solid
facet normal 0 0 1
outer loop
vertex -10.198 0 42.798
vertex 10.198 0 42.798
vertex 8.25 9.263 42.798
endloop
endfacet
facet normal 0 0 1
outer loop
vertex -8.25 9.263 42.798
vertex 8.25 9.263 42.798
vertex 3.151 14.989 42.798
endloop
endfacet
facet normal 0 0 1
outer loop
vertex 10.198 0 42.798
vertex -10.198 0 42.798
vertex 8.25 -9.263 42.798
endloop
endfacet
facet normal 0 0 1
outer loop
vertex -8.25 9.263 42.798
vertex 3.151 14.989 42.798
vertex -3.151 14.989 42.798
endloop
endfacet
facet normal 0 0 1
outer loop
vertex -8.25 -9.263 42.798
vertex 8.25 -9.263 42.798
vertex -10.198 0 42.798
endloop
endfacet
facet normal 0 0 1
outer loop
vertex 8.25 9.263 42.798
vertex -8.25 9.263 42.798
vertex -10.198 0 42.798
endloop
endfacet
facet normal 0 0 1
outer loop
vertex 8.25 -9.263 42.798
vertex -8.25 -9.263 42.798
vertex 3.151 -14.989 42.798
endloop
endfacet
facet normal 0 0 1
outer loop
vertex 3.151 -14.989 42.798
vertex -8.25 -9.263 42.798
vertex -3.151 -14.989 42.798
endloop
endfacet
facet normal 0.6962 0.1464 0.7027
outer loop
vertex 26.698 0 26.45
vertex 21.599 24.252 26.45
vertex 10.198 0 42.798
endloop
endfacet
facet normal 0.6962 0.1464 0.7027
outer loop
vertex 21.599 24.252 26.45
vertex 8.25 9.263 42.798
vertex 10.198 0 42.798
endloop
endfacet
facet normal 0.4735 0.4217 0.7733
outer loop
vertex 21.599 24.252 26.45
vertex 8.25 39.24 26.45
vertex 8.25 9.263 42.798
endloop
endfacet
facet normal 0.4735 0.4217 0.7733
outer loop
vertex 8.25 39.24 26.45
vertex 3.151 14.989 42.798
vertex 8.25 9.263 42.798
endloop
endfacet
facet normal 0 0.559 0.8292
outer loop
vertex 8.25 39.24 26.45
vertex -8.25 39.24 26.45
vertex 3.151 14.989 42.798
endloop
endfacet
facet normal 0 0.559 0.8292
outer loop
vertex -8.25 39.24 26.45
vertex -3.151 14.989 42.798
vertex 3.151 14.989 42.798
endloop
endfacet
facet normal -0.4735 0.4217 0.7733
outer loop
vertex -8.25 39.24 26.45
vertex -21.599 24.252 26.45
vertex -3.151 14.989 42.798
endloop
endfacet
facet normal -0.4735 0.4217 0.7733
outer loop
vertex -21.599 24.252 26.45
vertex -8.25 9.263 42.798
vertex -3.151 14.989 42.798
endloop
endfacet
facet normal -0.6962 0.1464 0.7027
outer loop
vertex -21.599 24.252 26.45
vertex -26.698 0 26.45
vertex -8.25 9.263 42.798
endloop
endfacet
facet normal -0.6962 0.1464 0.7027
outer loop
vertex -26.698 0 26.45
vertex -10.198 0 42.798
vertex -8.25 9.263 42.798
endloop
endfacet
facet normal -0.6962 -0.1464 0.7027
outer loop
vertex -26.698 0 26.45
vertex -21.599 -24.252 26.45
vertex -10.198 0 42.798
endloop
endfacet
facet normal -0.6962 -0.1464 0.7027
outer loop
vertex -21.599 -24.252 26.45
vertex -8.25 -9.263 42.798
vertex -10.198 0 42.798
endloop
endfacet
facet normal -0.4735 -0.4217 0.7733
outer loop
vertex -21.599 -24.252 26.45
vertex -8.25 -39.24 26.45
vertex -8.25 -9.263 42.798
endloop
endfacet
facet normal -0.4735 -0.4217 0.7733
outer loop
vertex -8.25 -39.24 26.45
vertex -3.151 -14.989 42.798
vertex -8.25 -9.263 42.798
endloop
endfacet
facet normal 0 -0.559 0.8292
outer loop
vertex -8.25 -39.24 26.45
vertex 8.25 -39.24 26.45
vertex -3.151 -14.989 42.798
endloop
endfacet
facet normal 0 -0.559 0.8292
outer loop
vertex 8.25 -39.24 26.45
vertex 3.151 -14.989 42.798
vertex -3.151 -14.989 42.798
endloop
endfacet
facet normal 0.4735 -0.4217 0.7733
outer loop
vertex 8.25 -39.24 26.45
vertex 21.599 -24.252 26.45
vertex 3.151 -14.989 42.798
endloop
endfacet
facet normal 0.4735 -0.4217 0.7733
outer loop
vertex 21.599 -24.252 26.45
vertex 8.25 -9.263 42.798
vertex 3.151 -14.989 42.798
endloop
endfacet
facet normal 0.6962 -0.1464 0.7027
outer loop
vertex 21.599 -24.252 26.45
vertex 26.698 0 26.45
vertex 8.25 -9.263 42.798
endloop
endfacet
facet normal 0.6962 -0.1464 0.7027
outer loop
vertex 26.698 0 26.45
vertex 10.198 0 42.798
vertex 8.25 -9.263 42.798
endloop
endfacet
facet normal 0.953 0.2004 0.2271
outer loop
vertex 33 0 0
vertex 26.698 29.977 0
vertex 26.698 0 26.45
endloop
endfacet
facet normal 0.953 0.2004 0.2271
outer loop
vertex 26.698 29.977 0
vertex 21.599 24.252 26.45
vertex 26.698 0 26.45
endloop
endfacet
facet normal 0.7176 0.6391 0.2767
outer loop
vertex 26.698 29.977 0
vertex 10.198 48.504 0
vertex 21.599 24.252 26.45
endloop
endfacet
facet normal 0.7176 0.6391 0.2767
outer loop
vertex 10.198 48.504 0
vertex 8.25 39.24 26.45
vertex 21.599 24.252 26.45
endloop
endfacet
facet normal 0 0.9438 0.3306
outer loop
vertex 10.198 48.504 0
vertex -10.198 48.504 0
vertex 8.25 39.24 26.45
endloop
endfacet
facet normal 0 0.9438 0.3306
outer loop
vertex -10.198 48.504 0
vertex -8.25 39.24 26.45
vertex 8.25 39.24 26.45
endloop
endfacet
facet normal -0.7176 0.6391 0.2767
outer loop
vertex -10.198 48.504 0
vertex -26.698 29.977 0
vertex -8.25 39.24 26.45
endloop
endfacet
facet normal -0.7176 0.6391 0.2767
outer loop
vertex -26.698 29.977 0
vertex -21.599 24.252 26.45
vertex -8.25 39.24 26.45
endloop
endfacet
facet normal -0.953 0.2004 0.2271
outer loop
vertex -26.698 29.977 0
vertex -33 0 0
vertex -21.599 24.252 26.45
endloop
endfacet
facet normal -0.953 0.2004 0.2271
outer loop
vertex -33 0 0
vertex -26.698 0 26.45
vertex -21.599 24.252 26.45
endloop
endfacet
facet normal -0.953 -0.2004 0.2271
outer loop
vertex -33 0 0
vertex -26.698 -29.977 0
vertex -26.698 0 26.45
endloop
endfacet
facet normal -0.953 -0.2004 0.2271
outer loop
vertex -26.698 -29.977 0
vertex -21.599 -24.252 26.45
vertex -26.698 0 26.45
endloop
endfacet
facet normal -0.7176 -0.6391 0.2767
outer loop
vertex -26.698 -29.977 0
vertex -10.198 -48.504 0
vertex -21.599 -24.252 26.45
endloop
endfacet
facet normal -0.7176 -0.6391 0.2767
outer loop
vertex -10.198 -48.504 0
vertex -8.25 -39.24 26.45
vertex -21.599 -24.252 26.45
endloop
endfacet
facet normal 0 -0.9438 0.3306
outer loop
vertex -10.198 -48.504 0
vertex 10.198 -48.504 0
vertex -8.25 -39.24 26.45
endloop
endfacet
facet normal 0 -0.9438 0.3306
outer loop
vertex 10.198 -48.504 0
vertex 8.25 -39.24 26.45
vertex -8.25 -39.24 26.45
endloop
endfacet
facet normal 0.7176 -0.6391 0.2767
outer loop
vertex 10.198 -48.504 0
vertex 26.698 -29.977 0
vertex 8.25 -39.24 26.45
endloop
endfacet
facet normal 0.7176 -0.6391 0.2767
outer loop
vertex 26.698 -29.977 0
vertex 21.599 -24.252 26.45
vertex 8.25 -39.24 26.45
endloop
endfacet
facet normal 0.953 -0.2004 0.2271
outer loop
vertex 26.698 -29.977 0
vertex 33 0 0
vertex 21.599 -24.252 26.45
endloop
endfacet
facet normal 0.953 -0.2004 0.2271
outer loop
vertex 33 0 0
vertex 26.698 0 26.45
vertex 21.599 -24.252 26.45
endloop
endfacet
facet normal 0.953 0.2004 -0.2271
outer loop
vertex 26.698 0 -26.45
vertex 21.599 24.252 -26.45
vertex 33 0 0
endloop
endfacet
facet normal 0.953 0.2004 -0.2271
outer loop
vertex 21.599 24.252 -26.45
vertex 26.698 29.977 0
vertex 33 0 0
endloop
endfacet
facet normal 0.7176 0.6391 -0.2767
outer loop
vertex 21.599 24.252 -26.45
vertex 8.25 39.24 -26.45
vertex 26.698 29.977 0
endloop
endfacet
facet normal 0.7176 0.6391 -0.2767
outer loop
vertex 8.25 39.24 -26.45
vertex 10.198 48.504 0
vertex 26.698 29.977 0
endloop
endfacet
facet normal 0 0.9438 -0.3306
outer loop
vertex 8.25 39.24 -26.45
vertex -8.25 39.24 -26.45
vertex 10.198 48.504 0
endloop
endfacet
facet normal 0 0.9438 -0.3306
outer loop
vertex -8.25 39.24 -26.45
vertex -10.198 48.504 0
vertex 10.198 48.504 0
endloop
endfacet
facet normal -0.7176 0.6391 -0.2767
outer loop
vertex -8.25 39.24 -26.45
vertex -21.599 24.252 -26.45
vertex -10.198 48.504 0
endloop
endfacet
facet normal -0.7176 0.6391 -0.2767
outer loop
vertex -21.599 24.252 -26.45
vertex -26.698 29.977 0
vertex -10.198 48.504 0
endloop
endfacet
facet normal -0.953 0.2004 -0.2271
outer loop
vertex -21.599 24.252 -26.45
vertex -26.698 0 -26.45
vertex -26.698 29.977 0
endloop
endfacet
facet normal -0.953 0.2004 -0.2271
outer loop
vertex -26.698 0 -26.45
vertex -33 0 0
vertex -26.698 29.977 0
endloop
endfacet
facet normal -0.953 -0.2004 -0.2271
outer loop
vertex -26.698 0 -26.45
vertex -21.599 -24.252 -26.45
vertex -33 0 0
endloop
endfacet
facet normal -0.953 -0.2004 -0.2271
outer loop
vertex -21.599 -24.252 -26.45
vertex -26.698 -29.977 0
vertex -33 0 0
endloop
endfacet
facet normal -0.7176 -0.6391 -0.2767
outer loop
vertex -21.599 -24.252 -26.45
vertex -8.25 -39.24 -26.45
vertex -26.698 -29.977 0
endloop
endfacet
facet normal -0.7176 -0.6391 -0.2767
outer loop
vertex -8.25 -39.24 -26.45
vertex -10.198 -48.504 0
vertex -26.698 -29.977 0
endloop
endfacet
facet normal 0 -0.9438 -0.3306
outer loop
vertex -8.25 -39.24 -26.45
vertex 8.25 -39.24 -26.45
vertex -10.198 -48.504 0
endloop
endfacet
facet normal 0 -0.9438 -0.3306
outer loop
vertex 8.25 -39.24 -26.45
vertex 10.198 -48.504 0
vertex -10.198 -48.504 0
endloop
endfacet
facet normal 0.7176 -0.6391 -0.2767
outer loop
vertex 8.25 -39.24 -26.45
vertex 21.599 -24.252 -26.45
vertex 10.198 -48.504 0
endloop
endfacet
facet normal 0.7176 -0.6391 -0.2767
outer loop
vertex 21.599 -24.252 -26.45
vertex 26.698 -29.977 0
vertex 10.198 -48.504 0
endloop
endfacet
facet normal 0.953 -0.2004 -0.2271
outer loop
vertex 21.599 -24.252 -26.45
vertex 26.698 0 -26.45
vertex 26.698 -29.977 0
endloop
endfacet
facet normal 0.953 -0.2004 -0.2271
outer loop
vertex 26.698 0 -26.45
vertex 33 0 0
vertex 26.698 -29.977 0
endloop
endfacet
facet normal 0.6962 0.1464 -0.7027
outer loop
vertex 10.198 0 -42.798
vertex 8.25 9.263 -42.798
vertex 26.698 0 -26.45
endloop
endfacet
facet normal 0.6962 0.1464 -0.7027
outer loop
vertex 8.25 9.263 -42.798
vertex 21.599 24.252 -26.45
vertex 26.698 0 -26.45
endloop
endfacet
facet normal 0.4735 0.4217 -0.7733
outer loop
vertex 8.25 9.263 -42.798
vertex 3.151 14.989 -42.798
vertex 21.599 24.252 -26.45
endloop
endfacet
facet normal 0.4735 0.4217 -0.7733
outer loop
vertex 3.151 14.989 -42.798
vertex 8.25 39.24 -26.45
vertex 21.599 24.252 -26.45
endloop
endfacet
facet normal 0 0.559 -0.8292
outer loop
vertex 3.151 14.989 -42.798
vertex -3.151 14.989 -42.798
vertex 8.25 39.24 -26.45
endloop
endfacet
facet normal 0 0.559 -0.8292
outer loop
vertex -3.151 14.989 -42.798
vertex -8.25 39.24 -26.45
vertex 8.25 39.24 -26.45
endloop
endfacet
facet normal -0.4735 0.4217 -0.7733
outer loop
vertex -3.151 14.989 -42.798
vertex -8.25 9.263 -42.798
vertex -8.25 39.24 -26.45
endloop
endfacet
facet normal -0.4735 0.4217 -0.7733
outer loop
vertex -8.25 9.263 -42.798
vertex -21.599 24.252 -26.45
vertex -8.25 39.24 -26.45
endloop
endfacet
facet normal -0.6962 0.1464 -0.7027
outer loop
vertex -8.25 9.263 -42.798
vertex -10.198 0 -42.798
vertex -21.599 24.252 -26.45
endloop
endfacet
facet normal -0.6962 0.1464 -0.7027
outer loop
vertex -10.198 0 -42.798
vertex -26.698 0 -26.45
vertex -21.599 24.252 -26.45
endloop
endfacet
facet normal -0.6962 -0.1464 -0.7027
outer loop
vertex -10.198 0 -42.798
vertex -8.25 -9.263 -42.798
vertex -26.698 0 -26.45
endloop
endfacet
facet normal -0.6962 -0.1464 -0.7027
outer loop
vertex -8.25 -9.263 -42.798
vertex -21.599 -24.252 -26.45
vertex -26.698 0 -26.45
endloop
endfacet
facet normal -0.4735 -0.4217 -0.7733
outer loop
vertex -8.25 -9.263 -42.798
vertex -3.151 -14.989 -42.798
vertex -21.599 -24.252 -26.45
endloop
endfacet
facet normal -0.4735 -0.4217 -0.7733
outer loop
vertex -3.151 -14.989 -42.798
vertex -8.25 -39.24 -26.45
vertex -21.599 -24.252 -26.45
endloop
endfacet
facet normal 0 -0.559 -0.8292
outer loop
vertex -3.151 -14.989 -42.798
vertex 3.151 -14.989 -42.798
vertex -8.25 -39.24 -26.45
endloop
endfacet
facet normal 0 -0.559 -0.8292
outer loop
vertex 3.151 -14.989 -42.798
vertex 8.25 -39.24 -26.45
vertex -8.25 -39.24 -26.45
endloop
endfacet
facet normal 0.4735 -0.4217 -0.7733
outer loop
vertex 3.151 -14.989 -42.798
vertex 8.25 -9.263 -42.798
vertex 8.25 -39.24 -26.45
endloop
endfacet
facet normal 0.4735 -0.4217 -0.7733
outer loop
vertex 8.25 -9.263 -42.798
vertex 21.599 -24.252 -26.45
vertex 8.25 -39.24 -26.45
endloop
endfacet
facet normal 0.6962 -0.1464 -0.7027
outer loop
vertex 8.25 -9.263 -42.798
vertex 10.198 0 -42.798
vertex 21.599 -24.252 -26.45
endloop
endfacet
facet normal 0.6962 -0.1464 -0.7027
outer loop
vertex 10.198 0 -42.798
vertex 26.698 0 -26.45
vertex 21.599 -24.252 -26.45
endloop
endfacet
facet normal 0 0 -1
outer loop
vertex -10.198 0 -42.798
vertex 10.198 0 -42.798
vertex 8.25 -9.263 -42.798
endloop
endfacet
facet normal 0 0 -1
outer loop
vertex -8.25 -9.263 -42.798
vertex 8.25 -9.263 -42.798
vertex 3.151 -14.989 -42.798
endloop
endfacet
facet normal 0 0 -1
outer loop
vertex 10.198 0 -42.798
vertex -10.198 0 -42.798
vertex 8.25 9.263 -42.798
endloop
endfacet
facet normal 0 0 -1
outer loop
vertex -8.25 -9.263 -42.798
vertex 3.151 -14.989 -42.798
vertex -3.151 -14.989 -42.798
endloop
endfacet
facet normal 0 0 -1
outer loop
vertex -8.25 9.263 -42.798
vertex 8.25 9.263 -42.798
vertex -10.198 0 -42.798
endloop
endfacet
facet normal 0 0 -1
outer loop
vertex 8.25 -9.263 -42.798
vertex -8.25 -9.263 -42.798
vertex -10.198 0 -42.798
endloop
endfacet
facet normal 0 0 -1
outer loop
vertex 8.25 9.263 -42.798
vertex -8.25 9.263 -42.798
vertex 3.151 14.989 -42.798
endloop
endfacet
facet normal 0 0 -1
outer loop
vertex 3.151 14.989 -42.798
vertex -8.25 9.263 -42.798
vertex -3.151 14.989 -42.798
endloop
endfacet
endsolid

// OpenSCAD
// Generated by SolidPython 1.0.1 on 2020-07-29 00:46:50


scale(v = [11, 17, 15]) {
	sphere(r = 3);
}
/***********************************************
*********      SolidPython code:      **********
************************************************
 
# import packages: SolidPython
from solid import *
from solid.utils import *
from itertools import chain, combinations, permutations


class Resize:

    def __init__(self, scad_file):
        self.scad_file = scad_file
        #self.scad_file = import_scad(scad_file)
        # cone/cylinder param:
        self.r1 = 0
        self.r2 = 0
        self.h = 0
        # rectangular prism param:
        self.w = 0
        self.l = 0
        # ellipse param:
        self.r = 0

    # import OpenScad code (file name corresponds to shape)


    # classify shape + parameters
    def assign(self, param1, param2, param3):
        if self.scad_file == 'cone.scad':
            self.r1 = param1
            self.r2 = param2
            self.h = param3
        elif self.scad_file == 'cylinder.scad':
            self.r1 = param1
            self.r2 = param2
            self.h = param3
        elif self.scad_file == 'rectangularPrism.scad':
            self.h = param1
            self.l = param2
            self.w = param3
        else:
            self.r = param1
            self.h = param2

    # resize parameters
    def iterate(self):
        x = range(3, 20, 2)
        i = 1
        if self.scad_file == 'cone.scad':
            tempList = list(permutations(x, 2))
            for temp in tempList:
                param1 = temp[0]
                param2 = temp[1]
                filepath = 'produced_scad_files/' + 'cone' + str(param1) + '_' + str(param2) + '_' + '.scad'
                scad_render_to_file(cylinder(h=param1, r1=param2, r2=0), filepath)

        elif self.scad_file == 'cylinder.scad':
            tempList = list(permutations(x, 3))
            for temp in tempList:
                param1 = temp[0]
                param2 = temp[1]
                filepath = 'produced_scad_files/' + 'cylinder' + str(param1) + '_' + str(param2) + '_' + '.scad'
                scad_render_to_file(cylinder(h=param1, r1=param2, r2=param2), filepath)

        elif self.scad_file == 'rectangularPrism.scad':
            tempList = list(permutations(x, 3))
            for temp in tempList:
                param1 = temp[0]
                param2 = temp[1]
                param3 = temp[2]
                filepath = 'produced_scad_files/' + 'rectangularPrism' + str(param1) + '_' + str(param2) + '_' + str(
                    param3) + '.scad'
                scad_render_to_file(cube(size=(param1, param2, param3)), filepath)

        elif self.scad_file == 'ellipse.scad':
            tempList = list(permutations(x, 4))
            for temp in tempList:
                param1 = temp[0]
                param2 = temp[1]
                param3 = temp[2]
                param4 = temp[3]
                filepath = 'produced_scad_files/' + 'ellipse' + str(param1) + '_' + str(param2) + '_' + str(param3) + '_' + str(param4) + '.scad'
                scad_render_to_file(scale([param1, param2, param3])(sphere(r=param4)), filepath)

    def render_to_scadfile(self):
        scad_render_to_file(scad, 'example.scad') 
 
************************************************/
